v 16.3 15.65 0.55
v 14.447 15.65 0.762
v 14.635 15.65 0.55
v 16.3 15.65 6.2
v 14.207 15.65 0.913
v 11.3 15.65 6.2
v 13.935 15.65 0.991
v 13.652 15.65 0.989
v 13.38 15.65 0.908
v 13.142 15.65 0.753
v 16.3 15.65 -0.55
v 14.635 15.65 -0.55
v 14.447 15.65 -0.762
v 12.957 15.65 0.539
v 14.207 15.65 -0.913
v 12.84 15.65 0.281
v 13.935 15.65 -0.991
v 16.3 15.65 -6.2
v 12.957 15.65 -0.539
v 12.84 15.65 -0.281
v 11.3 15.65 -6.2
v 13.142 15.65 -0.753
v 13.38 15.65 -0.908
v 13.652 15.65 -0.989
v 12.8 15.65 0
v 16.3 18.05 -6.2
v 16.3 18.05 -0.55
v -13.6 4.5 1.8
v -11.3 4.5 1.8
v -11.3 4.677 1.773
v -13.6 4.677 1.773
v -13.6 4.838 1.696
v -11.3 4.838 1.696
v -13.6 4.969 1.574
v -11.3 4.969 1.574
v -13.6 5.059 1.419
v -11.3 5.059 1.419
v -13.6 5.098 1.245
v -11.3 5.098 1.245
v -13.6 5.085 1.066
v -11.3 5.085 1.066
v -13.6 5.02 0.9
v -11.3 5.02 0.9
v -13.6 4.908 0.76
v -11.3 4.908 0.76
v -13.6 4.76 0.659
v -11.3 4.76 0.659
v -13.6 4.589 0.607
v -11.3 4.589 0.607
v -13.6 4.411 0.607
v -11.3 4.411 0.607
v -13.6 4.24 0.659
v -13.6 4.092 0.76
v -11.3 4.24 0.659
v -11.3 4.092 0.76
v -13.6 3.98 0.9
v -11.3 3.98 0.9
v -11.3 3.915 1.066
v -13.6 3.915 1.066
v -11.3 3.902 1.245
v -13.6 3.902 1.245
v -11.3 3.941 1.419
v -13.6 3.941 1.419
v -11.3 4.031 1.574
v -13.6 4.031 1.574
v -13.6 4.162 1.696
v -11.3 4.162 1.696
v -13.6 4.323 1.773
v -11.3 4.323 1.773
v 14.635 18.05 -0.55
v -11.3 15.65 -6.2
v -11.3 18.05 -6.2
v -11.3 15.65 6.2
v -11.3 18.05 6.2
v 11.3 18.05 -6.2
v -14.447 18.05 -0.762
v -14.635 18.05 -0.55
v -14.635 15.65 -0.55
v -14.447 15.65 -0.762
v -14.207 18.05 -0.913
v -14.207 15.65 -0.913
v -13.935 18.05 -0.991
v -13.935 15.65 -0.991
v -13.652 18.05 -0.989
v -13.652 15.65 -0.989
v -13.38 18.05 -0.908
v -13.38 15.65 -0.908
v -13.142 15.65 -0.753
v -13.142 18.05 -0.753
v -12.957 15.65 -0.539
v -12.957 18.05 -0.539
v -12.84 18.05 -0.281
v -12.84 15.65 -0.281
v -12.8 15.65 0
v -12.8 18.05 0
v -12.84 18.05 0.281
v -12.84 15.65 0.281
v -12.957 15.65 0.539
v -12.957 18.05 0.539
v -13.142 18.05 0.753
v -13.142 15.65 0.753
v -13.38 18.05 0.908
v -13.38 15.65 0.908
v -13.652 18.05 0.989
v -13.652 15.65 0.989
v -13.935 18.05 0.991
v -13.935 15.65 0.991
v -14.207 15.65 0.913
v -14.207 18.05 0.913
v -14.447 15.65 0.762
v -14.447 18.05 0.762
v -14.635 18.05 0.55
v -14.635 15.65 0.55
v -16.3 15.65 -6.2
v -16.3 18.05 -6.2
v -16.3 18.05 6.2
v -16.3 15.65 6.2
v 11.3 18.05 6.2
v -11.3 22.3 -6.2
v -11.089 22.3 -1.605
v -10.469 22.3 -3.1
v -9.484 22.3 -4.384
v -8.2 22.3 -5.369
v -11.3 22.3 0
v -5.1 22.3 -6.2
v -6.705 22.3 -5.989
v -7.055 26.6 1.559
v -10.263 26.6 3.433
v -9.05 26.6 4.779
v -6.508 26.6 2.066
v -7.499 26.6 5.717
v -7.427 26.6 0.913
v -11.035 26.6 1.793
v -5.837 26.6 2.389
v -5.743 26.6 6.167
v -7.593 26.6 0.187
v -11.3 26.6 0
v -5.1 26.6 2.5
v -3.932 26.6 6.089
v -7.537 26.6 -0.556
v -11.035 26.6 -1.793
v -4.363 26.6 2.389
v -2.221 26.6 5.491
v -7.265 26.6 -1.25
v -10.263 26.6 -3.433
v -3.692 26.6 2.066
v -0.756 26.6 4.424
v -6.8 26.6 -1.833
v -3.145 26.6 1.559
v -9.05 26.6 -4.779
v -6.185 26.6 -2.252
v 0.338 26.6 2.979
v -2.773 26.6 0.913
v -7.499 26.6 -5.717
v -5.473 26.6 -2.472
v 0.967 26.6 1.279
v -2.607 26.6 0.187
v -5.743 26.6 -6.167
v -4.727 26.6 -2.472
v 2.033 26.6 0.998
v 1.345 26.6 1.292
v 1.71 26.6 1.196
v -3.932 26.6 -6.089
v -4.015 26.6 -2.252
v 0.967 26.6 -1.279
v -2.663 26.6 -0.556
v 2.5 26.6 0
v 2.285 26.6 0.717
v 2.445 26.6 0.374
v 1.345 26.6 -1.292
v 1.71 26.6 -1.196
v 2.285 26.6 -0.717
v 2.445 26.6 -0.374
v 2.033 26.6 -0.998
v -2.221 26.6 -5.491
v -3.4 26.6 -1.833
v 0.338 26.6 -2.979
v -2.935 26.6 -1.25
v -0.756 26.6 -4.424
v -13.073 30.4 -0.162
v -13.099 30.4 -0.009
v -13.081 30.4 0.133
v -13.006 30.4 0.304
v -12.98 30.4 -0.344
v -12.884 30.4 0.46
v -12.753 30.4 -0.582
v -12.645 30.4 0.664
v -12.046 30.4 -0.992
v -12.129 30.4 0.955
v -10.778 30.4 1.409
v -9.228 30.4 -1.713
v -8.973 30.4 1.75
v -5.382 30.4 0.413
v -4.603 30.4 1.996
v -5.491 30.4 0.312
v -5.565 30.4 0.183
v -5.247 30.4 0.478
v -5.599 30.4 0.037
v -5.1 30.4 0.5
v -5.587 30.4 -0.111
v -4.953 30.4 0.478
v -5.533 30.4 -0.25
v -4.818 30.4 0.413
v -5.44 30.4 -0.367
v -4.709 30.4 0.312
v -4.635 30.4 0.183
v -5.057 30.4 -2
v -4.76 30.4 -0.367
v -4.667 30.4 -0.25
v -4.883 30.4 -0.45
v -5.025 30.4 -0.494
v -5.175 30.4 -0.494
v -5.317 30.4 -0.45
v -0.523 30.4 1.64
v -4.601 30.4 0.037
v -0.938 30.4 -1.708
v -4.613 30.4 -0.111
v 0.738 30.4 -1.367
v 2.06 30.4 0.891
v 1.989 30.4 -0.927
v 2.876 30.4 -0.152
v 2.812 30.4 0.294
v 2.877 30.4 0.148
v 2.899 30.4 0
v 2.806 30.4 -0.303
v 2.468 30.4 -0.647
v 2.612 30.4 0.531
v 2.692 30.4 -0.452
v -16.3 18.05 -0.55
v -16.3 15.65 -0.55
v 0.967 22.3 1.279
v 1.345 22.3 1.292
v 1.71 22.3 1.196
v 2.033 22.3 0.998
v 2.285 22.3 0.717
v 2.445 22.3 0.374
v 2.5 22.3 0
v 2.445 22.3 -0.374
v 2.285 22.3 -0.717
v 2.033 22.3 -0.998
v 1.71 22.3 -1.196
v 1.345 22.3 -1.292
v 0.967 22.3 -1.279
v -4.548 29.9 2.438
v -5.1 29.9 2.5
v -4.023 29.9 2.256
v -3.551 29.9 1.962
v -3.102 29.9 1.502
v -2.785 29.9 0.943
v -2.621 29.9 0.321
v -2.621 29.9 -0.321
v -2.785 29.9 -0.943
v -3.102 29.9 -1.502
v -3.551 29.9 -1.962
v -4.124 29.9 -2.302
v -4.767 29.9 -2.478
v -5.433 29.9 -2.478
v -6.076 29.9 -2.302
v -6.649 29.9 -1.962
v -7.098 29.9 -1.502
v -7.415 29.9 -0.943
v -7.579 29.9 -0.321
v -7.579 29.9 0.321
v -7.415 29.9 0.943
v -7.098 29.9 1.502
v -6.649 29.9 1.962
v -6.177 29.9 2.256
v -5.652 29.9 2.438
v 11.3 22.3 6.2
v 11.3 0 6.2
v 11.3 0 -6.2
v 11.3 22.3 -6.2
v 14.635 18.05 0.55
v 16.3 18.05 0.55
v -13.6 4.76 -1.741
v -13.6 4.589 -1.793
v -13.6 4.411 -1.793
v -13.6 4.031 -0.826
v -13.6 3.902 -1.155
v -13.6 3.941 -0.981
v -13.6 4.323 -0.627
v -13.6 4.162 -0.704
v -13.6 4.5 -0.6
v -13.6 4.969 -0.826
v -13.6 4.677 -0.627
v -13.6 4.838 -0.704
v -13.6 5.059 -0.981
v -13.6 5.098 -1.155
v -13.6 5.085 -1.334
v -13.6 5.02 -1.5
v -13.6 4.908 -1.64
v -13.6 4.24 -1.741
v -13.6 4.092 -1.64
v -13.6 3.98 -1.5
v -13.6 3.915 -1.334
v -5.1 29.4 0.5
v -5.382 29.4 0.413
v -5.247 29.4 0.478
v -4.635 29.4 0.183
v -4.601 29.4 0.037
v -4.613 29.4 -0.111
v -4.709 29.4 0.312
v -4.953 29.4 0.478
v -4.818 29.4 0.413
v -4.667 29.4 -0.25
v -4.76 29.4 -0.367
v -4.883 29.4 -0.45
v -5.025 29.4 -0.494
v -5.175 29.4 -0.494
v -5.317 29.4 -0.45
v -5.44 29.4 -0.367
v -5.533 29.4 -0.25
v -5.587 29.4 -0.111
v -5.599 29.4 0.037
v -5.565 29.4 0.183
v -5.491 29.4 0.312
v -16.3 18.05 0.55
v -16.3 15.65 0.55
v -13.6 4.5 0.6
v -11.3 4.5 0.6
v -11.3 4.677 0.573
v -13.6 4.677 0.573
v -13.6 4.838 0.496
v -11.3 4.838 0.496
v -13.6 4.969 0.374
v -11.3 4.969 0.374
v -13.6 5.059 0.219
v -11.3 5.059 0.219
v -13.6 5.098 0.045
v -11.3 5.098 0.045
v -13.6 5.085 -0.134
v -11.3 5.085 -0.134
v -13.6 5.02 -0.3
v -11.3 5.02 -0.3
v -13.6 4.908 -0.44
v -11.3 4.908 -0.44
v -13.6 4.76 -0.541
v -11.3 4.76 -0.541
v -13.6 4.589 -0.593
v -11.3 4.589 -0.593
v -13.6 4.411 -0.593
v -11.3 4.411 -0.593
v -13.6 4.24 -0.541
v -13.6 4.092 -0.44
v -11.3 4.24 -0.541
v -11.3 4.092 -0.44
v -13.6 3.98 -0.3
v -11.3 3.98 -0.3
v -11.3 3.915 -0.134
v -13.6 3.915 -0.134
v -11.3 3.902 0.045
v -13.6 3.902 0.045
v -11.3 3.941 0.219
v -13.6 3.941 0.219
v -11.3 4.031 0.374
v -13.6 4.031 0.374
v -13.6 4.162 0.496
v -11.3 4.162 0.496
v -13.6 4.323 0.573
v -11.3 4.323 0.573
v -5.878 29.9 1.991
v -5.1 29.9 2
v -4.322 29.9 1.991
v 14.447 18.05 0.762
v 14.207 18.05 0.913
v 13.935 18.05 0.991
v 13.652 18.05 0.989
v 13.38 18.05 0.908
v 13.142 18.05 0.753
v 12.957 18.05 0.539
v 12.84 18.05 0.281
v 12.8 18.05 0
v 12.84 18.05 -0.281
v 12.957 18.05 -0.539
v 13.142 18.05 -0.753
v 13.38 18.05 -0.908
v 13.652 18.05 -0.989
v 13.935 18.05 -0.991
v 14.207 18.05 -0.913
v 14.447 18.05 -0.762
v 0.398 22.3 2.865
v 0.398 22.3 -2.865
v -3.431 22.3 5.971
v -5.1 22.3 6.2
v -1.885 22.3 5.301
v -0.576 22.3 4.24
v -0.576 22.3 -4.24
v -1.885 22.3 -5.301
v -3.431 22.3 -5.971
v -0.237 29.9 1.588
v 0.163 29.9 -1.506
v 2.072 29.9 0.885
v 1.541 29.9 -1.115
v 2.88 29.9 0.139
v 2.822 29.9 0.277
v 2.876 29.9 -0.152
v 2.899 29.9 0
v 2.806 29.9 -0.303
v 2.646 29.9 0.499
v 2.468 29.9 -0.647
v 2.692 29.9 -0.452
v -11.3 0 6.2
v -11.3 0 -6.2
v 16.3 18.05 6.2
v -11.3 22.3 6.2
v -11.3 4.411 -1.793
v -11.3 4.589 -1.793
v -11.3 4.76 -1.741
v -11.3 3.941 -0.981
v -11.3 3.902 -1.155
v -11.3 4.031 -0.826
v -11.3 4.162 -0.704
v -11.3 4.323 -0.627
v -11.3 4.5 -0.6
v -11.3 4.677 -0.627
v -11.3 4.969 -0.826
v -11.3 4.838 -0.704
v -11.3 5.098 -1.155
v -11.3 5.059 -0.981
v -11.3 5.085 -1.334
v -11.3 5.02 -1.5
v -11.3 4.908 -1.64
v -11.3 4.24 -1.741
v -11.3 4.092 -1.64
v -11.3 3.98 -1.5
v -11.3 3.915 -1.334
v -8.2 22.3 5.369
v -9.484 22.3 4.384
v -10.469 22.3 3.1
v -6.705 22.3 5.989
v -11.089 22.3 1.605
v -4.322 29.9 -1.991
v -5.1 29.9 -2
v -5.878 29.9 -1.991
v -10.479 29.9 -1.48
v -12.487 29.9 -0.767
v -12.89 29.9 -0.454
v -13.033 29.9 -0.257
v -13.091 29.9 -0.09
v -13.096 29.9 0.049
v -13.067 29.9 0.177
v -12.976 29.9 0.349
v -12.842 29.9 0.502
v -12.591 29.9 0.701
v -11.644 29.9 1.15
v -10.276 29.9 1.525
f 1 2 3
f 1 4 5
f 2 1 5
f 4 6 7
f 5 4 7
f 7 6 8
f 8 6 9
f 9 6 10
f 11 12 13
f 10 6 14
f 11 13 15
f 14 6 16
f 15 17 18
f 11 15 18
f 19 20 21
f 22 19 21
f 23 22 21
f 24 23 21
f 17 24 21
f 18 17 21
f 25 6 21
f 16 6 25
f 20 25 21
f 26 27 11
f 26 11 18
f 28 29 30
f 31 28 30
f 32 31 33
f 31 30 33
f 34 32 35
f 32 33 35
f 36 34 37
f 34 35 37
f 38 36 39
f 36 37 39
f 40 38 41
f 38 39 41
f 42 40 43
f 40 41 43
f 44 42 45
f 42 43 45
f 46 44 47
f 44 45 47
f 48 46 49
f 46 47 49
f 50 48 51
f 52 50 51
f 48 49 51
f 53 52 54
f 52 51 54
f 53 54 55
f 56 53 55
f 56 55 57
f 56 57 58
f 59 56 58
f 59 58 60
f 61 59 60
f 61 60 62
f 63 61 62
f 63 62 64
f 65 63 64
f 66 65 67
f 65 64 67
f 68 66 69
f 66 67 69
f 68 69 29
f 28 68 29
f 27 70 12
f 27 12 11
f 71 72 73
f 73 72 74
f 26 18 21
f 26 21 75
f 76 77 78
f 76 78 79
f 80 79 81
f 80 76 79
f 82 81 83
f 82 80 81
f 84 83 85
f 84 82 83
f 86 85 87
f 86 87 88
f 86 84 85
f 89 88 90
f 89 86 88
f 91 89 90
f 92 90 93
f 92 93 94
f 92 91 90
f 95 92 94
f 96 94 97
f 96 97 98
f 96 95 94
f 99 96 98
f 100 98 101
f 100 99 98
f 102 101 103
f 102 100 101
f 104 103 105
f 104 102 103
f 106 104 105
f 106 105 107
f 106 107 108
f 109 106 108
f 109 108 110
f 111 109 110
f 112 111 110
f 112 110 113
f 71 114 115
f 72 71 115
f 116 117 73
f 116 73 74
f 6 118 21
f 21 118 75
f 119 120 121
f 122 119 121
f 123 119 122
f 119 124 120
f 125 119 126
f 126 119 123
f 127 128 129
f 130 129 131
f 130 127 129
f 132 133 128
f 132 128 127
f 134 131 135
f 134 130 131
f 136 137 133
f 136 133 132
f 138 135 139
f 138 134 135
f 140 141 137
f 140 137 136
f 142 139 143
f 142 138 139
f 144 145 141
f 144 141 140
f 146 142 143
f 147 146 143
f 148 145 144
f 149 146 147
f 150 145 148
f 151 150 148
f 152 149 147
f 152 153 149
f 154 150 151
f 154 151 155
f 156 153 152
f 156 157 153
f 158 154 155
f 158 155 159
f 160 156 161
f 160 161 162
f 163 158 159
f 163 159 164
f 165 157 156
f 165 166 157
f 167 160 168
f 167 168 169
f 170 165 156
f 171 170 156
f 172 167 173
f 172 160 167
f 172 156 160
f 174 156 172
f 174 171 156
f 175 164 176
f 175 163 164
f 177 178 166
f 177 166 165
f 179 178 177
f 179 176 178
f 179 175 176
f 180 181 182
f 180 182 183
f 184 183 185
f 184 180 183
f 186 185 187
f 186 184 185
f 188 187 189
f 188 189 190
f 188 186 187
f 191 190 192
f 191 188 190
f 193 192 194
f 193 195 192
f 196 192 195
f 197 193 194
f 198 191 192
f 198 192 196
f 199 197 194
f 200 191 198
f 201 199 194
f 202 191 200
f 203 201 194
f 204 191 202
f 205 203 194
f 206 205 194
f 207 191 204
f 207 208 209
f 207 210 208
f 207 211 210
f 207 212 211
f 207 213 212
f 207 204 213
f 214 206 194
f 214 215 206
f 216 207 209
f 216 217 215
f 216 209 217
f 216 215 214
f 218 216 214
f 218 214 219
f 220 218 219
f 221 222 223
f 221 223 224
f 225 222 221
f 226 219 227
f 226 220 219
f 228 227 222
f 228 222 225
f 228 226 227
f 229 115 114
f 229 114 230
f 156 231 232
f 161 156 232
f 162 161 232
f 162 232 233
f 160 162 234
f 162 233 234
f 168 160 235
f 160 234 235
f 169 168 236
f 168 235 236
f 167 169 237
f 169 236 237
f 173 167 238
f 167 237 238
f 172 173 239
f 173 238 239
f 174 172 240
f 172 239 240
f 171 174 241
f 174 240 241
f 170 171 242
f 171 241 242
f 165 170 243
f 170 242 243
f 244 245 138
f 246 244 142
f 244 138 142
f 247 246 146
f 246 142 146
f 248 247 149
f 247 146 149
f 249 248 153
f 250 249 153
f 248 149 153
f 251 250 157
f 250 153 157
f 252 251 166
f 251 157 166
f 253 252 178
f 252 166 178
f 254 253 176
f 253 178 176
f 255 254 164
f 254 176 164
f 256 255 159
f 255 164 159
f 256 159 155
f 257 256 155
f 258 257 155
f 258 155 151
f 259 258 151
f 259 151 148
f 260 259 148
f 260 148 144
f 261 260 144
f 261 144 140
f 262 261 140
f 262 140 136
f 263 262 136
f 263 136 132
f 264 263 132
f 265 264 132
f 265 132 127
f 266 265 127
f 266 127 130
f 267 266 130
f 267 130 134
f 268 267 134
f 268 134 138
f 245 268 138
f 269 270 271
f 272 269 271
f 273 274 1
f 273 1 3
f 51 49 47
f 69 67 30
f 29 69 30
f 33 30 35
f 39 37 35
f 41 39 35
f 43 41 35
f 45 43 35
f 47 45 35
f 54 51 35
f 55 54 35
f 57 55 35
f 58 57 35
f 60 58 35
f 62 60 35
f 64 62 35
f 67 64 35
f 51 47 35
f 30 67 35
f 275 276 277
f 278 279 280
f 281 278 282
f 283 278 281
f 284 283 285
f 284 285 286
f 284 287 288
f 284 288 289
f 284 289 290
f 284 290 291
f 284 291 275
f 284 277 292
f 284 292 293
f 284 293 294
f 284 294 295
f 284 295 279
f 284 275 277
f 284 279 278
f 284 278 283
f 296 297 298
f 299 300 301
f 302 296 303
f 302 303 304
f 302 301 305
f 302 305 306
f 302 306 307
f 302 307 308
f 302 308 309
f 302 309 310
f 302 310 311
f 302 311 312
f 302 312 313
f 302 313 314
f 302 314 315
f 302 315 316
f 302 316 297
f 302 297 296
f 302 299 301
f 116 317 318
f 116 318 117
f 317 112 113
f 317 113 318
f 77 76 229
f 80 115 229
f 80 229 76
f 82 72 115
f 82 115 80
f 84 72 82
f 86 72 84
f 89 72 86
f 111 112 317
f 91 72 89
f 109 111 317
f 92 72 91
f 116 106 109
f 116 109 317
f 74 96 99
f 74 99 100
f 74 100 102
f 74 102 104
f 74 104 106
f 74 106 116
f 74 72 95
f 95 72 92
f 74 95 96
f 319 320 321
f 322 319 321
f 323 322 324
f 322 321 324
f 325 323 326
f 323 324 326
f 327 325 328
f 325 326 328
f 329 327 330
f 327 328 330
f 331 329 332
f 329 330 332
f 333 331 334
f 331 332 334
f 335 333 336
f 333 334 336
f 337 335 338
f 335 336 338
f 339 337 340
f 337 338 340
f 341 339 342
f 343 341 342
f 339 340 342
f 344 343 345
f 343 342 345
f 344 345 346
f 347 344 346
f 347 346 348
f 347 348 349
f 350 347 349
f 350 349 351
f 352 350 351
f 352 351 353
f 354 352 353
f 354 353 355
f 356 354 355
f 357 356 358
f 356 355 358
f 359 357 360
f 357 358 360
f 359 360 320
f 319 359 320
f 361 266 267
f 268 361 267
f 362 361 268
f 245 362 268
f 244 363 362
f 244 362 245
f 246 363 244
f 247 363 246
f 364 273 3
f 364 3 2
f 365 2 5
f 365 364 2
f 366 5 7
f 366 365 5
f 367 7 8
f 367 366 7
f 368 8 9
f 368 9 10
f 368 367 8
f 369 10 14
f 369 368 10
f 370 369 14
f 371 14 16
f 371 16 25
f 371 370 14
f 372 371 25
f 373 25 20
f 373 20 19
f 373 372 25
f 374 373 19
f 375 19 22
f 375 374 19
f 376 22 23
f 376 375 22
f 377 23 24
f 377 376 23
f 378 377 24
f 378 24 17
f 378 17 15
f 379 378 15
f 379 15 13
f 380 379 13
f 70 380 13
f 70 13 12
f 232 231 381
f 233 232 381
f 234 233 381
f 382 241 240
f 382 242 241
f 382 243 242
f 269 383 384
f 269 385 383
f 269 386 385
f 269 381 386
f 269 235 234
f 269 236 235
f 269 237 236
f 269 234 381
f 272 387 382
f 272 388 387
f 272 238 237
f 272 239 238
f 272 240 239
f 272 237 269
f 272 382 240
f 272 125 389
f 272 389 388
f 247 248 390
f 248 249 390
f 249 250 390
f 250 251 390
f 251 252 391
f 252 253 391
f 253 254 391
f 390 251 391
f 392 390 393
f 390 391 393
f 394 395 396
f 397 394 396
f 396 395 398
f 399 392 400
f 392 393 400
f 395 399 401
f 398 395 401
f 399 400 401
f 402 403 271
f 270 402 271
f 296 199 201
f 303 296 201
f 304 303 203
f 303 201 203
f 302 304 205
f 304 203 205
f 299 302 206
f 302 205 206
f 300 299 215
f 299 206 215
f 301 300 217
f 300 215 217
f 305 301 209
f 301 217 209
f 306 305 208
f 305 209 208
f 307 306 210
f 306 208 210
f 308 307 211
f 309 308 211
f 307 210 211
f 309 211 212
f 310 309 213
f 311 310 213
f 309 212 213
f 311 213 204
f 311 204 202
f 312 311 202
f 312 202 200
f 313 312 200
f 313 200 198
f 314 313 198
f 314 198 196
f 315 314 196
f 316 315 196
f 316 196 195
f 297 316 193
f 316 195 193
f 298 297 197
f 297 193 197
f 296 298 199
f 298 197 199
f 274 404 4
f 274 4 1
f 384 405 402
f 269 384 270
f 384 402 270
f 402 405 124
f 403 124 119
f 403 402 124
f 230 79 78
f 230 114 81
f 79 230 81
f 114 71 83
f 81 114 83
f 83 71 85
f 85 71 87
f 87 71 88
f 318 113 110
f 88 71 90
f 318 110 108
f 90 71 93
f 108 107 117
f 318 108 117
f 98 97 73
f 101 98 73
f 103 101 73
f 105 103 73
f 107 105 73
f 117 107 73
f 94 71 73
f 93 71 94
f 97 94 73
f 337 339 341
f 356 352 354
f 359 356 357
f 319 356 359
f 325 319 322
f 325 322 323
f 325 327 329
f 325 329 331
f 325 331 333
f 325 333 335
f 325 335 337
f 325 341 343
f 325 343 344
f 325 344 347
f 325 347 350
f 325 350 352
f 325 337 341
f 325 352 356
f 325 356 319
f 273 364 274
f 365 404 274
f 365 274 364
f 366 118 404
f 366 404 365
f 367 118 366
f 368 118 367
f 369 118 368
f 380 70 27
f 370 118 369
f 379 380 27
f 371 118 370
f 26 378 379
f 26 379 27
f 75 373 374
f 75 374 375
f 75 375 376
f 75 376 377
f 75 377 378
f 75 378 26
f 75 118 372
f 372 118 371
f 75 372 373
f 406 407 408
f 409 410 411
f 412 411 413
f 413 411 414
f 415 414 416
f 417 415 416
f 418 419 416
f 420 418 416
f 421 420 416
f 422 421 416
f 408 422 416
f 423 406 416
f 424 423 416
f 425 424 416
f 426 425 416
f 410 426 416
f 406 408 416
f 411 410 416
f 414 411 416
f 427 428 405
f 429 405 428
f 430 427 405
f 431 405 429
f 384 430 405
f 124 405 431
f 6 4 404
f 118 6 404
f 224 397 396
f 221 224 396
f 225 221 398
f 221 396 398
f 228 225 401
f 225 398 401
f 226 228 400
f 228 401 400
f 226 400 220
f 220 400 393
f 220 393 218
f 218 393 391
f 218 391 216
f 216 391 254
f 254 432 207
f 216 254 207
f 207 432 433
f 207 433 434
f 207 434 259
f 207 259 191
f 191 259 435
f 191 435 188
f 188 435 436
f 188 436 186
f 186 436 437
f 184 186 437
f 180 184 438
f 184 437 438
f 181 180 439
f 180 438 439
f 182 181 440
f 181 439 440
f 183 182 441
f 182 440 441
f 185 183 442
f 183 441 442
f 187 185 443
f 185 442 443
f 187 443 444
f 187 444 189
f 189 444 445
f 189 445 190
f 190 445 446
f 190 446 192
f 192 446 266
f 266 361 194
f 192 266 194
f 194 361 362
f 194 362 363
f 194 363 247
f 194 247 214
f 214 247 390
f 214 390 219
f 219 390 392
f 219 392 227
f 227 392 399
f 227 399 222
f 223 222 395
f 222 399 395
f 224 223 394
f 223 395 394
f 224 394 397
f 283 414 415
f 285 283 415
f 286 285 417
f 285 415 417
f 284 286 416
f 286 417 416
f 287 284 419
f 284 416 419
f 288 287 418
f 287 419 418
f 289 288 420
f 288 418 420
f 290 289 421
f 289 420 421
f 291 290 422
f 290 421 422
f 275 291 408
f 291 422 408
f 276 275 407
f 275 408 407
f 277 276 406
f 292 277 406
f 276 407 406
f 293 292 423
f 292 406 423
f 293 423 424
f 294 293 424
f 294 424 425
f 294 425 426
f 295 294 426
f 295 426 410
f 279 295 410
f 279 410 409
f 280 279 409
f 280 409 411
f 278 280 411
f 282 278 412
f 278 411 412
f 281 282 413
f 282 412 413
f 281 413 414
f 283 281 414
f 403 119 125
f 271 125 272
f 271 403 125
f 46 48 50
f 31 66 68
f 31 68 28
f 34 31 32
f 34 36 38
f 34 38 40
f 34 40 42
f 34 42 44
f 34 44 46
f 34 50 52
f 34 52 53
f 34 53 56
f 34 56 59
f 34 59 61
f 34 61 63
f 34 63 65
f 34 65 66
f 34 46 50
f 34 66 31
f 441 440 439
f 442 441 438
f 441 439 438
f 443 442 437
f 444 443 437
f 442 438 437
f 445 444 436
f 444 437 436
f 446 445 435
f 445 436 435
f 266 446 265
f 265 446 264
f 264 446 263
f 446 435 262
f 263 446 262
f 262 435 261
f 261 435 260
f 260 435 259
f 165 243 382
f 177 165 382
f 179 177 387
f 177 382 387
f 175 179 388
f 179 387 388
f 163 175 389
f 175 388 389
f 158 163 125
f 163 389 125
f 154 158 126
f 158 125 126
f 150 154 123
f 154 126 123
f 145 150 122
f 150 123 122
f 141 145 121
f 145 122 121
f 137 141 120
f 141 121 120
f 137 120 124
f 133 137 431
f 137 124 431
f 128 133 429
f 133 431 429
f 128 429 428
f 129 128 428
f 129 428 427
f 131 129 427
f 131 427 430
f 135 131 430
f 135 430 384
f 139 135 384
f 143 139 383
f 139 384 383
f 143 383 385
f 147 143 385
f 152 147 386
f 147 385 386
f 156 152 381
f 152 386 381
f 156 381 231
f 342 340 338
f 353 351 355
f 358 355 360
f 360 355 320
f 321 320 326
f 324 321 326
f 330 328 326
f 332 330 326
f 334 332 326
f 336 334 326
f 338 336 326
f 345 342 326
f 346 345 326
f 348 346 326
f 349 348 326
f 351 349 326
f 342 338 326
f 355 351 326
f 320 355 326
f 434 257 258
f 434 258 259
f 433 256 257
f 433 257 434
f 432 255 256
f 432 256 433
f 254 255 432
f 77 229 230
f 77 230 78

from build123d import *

# Parameters (mm, degrees)
SKETCH1_W             = 22.6
SKETCH1_H             = 12.4
BOSS_EXTRUDE1_DEPTH   = 22.3
SKETCH2_W             = 12.4
SKETCH2_H             = 2.4
BOSS_EXTRUDE2_DEPTH   = 5
SKETCH3_W             = 12.4
SKETCH3_H             = 2.4
BOSS_EXTRUDE3_DEPTH   = 5
CUT_EXTRUDE1_DEPTH    = 2.4
CUT_EXTRUDE2_DEPTH    = 2.4
BOSS_EXTRUDE4_DEPTH   = 4.3
SKETCH7_R             = 2.5
BOSS_EXTRUDE5_DEPTH   = 3.3
SKETCH8_R             = 0.6
BOSS_EXTRUDE7_DEPTH   = 2.3
BOSS_EXTRUDE7_2_DEPTH = 2.3
BOSS_EXTRUDE7_3_DEPTH = 2.3
SKETCH9_RX            = 7.998818951
SKETCH9_RY            = 2
BOSS_EXTRUDE10_DEPTH  = 0.5
SKETCH12_R            = 0.5
CUT_EXTRUDE4_DEPTH    = 1


with BuildPart() as part:
    # Sketch1 → Boss-Extrude1 (new body)
    with BuildSketch(Plane(origin=(0, 0, 0), x_dir=(1, 0, 0), z_dir=(0, 1, 0))):
        Rectangle(SKETCH1_W, SKETCH1_H)
    extrude(amount=BOSS_EXTRUDE1_DEPTH)

    # Sketch6 → Boss-Extrude4 (add)
    with BuildSketch(Plane(origin=(0, 22.3, 0), x_dir=(1, 0, 0), z_dir=(0, 1, 0))):
        with BuildLine():
            ThreePointArc((0.966666667, -1.278888406), (2.5, 0), (0.966666667, 1.278888406))
            ThreePointArc((0.966666667, 1.278888406), (-11.3, 0), (0.966666667, -1.278888406))
        make_face()
    extrude(amount=BOSS_EXTRUDE4_DEPTH)

    # Sketch7 → Boss-Extrude5 (add)
    with BuildSketch(Plane(origin=(0, 26.6, 0), x_dir=(1, 0, 0), z_dir=(0, 1, 0))):
        with Locations(Location((-5.1, 0, 0), (0, 0, 270))):
            Circle(SKETCH7_R)
    extrude(amount=BOSS_EXTRUDE5_DEPTH)

    # Sketch9 → Boss-Extrude10 (add)
    with BuildSketch(Plane(origin=(0, 29.9, 0), x_dir=(1, 0, 0), z_dir=(0, 1, 0))):
        with Locations((-5.1, 0)):
            Ellipse(SKETCH9_RX, SKETCH9_RY)
    extrude(amount=BOSS_EXTRUDE10_DEPTH)

    # Sketch12 → Cut-Extrude4 (cut)
    with BuildSketch(Plane(origin=(0, 30.4, 0), x_dir=(1, 0, 0), z_dir=(0, 1, 0))):
        with Locations(Location((-5.1, 0, 0), (0, 0, 270))):
            Circle(SKETCH12_R)
    extrude(amount=-CUT_EXTRUDE4_DEPTH, mode=Mode.SUBTRACT)


with BuildPart() as body_2:
    # Sketch2 → Boss-Extrude2 (new body)
    with BuildSketch(Plane(origin=(11.3, 0, 0), x_dir=(0, 0, -1), z_dir=(1, 0, 0))):
        with Locations((0, 16.85)):
            Rectangle(SKETCH2_W, SKETCH2_H)
    extrude(amount=BOSS_EXTRUDE2_DEPTH)

    # Sketch5 → Cut-Extrude2 (cut)
    with BuildSketch(Plane(origin=(0, 18.05, 0), x_dir=(1, 0, 0), z_dir=(0, 1, 0))):
        with BuildLine():
            Line((14.635164654, 0.55), (16.3, 0.55))
            Line((16.3, 0.55), (16.3, -0.55))
            Line((16.3, -0.55), (14.635164654, -0.55))
            ThreePointArc((14.635164654, -0.55), (12.8, 0), (14.635164654, 0.55))
        make_face()
    extrude(amount=-CUT_EXTRUDE2_DEPTH, mode=Mode.SUBTRACT)


with BuildPart() as body_3:
    # Sketch3 → Boss-Extrude3 (new body)
    with BuildSketch(Plane.ZY.offset(11.3)):
        with Locations((0, 16.85)):
            Rectangle(SKETCH3_W, SKETCH3_H)
    extrude(amount=BOSS_EXTRUDE3_DEPTH)

    # Sketch4 → Cut-Extrude1 (cut)
    with BuildSketch(Plane(origin=(0, 18.05, 0), x_dir=(1, 0, 0), z_dir=(0, 1, 0))):
        with BuildLine():
            Line((-16.3, 0.55), (-14.635164654, 0.55))
            ThreePointArc((-14.635164654, 0.55), (-12.8, 0), (-14.635164654, -0.55))
            Line((-14.635164654, -0.55), (-16.3, -0.55))
            Line((-16.3, -0.55), (-16.3, 0.55))
        make_face()
        with BuildLine():
            Line((16.3, -0.55), (14.635164654, -0.55))
            ThreePointArc((14.635164654, -0.55), (12.8, 0), (14.635164654, 0.55))
            Line((14.635164654, 0.55), (16.3, 0.55))
            Line((16.3, 0.55), (16.3, -0.55))
        make_face()
    extrude(amount=-CUT_EXTRUDE1_DEPTH, mode=Mode.SUBTRACT)


with BuildPart() as body_4:
    # Sketch8 → Boss-Extrude7 (new body)
    with BuildSketch(Plane.ZY.offset(11.3)):
        with Locations((0, 4.5)):
            Circle(SKETCH8_R)
    extrude(amount=BOSS_EXTRUDE7_DEPTH)


with BuildPart() as body_5:
    # Sketch8 → Boss-Extrude7 2 (new body)
    with BuildSketch(Plane.ZY.offset(11.3)):
        with Locations((-1.2, 4.5)):
            Circle(SKETCH8_R)
    extrude(amount=BOSS_EXTRUDE7_2_DEPTH)


with BuildPart() as body_6:
    # Sketch8 → Boss-Extrude7 3 (new body)
    with BuildSketch(Plane.ZY.offset(11.3)):
        with Locations((1.2, 4.5)):
            Circle(SKETCH8_R)
    extrude(amount=BOSS_EXTRUDE7_3_DEPTH)


solid = Compound([part.part, body_2.part, body_3.part, body_4.part, body_5.part, body_6.part])
